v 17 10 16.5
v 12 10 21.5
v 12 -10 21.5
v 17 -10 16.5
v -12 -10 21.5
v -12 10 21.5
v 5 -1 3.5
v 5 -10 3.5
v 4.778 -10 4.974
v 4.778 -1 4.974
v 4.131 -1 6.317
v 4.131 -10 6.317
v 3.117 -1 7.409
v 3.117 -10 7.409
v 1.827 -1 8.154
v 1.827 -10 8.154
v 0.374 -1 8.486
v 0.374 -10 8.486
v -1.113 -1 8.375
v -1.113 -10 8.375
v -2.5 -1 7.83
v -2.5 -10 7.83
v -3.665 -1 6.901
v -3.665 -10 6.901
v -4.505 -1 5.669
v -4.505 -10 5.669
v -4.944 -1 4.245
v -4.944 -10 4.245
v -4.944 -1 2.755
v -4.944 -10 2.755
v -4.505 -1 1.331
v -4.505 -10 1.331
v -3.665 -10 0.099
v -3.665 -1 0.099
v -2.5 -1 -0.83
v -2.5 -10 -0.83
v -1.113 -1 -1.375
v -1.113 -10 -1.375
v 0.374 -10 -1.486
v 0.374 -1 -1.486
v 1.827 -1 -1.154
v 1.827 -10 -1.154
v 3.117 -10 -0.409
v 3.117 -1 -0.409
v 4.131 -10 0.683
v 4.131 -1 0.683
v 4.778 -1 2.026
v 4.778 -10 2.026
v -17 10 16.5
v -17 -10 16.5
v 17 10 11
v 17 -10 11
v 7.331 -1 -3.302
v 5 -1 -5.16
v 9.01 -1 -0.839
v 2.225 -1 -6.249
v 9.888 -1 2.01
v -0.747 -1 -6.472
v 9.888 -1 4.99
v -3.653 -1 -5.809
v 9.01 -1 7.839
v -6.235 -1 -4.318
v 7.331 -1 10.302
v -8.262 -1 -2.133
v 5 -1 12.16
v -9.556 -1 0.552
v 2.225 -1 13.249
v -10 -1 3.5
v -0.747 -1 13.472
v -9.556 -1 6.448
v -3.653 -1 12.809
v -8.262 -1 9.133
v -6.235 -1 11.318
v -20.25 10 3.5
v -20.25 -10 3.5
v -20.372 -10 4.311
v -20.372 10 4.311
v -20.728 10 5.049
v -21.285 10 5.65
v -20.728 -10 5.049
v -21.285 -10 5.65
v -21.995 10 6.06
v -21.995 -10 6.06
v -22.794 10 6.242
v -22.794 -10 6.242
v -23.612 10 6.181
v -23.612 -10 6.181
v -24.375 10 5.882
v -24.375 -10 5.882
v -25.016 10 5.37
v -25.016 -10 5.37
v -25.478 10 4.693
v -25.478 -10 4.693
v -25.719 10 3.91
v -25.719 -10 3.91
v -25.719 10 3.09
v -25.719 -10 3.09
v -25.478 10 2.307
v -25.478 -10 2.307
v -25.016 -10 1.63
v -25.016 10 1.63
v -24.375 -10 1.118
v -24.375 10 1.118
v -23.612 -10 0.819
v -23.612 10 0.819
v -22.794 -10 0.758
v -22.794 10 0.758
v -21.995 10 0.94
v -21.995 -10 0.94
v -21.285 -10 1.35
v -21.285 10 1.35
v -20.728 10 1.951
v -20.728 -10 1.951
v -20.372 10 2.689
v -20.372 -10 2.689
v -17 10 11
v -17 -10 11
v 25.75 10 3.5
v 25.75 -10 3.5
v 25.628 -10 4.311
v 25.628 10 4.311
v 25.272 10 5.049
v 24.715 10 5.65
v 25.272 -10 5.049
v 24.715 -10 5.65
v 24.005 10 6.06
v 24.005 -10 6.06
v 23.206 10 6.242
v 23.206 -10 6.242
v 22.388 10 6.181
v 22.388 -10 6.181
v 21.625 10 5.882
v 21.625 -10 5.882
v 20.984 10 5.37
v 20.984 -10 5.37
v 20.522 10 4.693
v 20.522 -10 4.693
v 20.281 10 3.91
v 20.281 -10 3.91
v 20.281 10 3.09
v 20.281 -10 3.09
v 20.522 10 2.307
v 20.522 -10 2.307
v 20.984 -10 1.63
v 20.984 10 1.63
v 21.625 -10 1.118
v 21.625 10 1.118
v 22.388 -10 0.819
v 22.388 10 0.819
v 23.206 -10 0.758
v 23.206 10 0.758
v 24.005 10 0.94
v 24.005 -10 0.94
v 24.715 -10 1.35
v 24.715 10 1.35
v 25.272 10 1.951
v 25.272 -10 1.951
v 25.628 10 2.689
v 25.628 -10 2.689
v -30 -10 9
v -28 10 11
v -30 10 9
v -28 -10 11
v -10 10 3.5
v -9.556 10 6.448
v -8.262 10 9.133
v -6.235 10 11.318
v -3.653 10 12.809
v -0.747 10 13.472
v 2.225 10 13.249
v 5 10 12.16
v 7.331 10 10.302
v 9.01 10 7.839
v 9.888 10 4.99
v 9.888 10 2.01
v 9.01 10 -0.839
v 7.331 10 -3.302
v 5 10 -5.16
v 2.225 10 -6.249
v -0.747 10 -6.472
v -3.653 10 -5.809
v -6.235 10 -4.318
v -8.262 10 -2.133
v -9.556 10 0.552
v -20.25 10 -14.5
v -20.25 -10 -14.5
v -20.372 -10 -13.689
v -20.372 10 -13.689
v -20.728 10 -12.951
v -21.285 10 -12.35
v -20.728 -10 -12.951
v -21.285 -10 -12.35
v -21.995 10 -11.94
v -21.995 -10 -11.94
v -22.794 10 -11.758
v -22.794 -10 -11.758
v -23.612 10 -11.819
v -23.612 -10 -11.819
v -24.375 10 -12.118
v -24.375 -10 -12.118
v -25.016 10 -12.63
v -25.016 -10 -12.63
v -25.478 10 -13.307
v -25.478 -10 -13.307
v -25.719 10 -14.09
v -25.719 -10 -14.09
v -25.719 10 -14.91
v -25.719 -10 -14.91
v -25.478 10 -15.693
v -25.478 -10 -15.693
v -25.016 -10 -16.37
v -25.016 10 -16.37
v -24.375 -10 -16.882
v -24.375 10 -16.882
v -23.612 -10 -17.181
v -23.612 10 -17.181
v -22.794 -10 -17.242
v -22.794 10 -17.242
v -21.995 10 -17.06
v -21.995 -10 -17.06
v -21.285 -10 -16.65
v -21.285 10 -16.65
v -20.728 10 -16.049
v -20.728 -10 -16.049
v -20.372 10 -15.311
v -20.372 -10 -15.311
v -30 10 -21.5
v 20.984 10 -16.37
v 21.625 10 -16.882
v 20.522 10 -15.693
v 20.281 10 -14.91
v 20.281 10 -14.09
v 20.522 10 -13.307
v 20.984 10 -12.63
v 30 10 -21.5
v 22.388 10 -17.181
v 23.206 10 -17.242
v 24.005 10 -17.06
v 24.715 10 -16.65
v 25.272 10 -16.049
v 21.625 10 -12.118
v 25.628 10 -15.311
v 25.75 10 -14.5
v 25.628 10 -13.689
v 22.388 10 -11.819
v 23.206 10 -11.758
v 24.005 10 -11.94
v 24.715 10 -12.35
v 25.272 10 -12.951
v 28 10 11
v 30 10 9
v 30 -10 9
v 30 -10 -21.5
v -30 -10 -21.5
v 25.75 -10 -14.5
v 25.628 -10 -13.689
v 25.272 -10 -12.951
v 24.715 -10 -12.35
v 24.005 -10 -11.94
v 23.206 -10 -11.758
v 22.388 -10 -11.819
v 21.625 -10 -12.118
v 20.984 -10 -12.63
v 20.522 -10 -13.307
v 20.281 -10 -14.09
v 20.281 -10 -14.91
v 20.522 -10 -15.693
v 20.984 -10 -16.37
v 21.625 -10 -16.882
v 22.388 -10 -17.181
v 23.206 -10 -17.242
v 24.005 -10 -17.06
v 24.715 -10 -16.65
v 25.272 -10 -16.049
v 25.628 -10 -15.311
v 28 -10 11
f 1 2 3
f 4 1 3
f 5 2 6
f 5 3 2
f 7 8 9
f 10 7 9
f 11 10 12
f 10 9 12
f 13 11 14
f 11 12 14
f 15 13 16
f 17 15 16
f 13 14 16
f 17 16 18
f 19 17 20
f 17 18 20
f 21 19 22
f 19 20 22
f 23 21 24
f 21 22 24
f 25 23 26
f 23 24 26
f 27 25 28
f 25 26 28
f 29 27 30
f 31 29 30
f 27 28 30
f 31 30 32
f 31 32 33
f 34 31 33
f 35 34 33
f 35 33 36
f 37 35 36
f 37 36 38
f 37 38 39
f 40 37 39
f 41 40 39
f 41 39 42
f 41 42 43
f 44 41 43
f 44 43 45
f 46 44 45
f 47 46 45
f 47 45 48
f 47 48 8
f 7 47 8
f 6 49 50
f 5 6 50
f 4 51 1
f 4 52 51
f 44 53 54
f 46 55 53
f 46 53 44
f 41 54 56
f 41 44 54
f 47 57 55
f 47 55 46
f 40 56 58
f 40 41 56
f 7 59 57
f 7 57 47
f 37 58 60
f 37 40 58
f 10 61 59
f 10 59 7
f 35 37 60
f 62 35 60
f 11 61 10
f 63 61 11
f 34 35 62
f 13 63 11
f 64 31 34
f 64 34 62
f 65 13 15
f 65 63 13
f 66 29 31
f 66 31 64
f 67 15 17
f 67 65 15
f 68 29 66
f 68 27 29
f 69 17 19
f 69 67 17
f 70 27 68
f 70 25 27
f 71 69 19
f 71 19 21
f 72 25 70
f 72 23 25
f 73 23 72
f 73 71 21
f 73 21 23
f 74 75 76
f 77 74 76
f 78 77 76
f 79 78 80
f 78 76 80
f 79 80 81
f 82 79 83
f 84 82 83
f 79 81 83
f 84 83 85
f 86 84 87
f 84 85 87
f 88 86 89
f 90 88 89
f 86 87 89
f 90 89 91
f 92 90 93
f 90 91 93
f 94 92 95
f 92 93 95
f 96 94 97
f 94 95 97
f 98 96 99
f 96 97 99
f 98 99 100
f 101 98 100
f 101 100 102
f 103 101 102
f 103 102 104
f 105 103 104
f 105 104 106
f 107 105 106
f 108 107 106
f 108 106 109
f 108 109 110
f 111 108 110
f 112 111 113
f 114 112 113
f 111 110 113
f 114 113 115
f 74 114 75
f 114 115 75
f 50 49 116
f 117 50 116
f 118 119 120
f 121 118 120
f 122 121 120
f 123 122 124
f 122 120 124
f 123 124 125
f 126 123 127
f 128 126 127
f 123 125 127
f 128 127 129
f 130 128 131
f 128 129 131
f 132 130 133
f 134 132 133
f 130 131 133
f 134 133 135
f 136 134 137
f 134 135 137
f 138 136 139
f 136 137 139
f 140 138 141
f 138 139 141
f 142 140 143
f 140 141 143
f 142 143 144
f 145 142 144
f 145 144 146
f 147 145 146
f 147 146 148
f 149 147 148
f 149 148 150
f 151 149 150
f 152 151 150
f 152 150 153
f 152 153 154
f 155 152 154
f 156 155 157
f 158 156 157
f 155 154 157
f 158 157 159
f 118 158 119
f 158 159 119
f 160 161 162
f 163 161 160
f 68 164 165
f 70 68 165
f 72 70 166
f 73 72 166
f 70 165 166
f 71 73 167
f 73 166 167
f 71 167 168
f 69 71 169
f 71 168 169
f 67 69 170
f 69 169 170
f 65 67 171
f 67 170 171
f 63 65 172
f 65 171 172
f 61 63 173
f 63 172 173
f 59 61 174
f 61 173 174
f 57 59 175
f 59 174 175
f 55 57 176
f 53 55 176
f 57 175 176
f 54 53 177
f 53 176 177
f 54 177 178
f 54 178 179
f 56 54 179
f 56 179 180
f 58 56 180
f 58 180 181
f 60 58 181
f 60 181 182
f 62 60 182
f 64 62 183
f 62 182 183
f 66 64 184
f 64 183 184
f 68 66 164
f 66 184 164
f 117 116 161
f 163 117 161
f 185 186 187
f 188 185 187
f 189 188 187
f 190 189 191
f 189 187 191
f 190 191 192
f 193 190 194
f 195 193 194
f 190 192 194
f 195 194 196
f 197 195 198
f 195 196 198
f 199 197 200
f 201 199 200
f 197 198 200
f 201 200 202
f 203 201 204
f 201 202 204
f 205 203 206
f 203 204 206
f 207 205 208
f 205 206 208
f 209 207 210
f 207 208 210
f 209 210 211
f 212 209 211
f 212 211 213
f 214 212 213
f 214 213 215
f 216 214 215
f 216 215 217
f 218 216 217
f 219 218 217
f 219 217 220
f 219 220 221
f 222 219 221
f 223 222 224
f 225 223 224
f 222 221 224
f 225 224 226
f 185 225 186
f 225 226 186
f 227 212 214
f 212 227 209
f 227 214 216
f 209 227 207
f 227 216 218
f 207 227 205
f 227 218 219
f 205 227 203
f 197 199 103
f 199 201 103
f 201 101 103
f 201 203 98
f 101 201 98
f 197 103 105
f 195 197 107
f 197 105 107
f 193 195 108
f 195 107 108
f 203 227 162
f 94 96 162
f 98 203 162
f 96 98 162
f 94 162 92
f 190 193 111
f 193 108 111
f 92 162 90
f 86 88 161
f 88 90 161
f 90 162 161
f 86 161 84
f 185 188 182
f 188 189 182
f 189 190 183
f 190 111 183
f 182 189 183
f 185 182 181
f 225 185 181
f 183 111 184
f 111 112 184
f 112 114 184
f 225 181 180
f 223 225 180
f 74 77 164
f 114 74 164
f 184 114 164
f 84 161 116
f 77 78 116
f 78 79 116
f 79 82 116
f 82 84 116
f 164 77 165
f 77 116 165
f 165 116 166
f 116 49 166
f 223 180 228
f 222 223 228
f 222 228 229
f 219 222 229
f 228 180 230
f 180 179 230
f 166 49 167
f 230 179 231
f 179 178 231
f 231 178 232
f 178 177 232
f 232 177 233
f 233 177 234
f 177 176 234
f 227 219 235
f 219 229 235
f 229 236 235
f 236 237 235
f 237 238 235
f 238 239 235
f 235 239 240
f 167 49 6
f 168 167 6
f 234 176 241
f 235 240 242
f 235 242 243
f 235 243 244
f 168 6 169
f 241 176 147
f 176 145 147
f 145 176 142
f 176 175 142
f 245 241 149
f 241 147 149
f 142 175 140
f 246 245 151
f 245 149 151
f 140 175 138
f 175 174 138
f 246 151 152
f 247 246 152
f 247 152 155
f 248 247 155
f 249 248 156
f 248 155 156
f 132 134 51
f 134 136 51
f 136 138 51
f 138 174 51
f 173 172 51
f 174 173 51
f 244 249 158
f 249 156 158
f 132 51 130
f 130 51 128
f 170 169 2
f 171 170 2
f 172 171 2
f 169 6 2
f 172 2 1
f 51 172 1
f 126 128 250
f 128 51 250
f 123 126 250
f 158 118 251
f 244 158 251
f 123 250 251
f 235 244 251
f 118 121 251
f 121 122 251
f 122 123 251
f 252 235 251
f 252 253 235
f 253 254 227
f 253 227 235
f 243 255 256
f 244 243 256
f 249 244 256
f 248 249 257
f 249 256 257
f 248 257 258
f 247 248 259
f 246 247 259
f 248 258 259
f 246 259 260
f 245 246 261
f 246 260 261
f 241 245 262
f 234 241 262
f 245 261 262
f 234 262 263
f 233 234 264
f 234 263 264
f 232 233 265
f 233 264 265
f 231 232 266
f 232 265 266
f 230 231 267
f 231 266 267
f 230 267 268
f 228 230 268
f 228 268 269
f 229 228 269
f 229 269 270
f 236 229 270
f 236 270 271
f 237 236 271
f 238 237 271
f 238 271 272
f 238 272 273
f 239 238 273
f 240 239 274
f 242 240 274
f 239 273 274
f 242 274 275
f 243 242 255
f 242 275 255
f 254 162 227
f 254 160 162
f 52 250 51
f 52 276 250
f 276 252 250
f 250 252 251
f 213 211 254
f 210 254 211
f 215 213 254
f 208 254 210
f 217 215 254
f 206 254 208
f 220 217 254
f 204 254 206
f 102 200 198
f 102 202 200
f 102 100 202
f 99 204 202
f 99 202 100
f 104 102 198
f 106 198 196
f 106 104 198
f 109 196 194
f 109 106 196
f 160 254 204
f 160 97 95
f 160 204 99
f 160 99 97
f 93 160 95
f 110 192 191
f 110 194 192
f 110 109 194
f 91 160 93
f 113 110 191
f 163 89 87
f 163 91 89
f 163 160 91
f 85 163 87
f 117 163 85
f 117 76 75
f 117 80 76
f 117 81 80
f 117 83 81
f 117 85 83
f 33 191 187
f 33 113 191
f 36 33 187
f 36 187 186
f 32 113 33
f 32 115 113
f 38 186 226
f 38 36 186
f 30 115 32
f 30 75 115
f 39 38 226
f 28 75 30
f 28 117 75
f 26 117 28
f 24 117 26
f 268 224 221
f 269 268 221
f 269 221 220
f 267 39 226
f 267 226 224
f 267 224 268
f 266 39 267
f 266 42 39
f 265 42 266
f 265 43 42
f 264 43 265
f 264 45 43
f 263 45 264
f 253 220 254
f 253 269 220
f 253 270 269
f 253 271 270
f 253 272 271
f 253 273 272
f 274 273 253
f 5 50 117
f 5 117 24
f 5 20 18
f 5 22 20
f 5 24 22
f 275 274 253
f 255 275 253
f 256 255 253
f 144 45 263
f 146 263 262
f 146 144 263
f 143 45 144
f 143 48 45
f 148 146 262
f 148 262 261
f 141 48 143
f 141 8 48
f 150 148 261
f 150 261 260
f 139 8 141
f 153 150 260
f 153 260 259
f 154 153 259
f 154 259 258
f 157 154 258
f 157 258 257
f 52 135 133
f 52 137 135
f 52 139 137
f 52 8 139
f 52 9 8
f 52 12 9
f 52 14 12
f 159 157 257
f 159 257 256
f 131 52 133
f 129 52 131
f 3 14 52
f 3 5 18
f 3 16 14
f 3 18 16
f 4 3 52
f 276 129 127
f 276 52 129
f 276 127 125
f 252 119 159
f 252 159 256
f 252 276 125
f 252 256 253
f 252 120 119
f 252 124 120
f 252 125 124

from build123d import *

# Parameters (mm, degrees)
F1_DEPTH = 10
F2_R     = 5
F2_R_2   = 2.75
F3_DEPTH = 20
F4_SIZE  = 5
F5_SIZE  = 2
F6_R     = 10
F7_DEPTH = 11


with BuildPart() as f1:
    # F0 (on Front) → F1 (new body, symmetric)
    with BuildSketch(Plane.XZ):
        Polygon((17, 11), (17, 21.5), (-17, 21.5), (-17, 11), (-30, 11), (-30, -21.5), (30, -21.5), (30, 11), align=None)
    extrude(amount=F1_DEPTH, both=True)

    # F2 (on face) → F3 (cut)
    with BuildSketch(Plane.XZ.offset(10)):
        with Locations((0, 3.5)):
            Circle(F2_R)
        with Locations((23, 3.5)):
            Circle(F2_R_2)
        with Locations((23, -14.5)):
            Circle(F2_R_2)
        with Locations((-23, -14.5)):
            Circle(F2_R_2)
        with Locations((-23, 3.5)):
            Circle(F2_R_2)
    extrude(amount=-F3_DEPTH, mode=Mode.SUBTRACT)

    # F4
    f4_edges = [f1.edges().sort_by_distance(p)[0] for p in [
        (-17, 0, 21.5),
        (17, 0, 21.5),
    ]]
    chamfer(f4_edges, length=F4_SIZE)

    # F5
    f5_edges = [f1.edges().sort_by_distance(p)[0] for p in [
        (30, 0, 11),
        (-30, 0, 11),
    ]]
    chamfer(f5_edges, length=F5_SIZE)

    # F6 (on face) → F7 (cut)
    with BuildSketch(Plane(origin=(0, 10, 0), x_dir=(-1, 0, 0), z_dir=(0, 1, 0))):
        with Locations((0, 3.5)):
            Circle(F6_R)
    extrude(amount=-F7_DEPTH, mode=Mode.SUBTRACT)


solid = f1.part
